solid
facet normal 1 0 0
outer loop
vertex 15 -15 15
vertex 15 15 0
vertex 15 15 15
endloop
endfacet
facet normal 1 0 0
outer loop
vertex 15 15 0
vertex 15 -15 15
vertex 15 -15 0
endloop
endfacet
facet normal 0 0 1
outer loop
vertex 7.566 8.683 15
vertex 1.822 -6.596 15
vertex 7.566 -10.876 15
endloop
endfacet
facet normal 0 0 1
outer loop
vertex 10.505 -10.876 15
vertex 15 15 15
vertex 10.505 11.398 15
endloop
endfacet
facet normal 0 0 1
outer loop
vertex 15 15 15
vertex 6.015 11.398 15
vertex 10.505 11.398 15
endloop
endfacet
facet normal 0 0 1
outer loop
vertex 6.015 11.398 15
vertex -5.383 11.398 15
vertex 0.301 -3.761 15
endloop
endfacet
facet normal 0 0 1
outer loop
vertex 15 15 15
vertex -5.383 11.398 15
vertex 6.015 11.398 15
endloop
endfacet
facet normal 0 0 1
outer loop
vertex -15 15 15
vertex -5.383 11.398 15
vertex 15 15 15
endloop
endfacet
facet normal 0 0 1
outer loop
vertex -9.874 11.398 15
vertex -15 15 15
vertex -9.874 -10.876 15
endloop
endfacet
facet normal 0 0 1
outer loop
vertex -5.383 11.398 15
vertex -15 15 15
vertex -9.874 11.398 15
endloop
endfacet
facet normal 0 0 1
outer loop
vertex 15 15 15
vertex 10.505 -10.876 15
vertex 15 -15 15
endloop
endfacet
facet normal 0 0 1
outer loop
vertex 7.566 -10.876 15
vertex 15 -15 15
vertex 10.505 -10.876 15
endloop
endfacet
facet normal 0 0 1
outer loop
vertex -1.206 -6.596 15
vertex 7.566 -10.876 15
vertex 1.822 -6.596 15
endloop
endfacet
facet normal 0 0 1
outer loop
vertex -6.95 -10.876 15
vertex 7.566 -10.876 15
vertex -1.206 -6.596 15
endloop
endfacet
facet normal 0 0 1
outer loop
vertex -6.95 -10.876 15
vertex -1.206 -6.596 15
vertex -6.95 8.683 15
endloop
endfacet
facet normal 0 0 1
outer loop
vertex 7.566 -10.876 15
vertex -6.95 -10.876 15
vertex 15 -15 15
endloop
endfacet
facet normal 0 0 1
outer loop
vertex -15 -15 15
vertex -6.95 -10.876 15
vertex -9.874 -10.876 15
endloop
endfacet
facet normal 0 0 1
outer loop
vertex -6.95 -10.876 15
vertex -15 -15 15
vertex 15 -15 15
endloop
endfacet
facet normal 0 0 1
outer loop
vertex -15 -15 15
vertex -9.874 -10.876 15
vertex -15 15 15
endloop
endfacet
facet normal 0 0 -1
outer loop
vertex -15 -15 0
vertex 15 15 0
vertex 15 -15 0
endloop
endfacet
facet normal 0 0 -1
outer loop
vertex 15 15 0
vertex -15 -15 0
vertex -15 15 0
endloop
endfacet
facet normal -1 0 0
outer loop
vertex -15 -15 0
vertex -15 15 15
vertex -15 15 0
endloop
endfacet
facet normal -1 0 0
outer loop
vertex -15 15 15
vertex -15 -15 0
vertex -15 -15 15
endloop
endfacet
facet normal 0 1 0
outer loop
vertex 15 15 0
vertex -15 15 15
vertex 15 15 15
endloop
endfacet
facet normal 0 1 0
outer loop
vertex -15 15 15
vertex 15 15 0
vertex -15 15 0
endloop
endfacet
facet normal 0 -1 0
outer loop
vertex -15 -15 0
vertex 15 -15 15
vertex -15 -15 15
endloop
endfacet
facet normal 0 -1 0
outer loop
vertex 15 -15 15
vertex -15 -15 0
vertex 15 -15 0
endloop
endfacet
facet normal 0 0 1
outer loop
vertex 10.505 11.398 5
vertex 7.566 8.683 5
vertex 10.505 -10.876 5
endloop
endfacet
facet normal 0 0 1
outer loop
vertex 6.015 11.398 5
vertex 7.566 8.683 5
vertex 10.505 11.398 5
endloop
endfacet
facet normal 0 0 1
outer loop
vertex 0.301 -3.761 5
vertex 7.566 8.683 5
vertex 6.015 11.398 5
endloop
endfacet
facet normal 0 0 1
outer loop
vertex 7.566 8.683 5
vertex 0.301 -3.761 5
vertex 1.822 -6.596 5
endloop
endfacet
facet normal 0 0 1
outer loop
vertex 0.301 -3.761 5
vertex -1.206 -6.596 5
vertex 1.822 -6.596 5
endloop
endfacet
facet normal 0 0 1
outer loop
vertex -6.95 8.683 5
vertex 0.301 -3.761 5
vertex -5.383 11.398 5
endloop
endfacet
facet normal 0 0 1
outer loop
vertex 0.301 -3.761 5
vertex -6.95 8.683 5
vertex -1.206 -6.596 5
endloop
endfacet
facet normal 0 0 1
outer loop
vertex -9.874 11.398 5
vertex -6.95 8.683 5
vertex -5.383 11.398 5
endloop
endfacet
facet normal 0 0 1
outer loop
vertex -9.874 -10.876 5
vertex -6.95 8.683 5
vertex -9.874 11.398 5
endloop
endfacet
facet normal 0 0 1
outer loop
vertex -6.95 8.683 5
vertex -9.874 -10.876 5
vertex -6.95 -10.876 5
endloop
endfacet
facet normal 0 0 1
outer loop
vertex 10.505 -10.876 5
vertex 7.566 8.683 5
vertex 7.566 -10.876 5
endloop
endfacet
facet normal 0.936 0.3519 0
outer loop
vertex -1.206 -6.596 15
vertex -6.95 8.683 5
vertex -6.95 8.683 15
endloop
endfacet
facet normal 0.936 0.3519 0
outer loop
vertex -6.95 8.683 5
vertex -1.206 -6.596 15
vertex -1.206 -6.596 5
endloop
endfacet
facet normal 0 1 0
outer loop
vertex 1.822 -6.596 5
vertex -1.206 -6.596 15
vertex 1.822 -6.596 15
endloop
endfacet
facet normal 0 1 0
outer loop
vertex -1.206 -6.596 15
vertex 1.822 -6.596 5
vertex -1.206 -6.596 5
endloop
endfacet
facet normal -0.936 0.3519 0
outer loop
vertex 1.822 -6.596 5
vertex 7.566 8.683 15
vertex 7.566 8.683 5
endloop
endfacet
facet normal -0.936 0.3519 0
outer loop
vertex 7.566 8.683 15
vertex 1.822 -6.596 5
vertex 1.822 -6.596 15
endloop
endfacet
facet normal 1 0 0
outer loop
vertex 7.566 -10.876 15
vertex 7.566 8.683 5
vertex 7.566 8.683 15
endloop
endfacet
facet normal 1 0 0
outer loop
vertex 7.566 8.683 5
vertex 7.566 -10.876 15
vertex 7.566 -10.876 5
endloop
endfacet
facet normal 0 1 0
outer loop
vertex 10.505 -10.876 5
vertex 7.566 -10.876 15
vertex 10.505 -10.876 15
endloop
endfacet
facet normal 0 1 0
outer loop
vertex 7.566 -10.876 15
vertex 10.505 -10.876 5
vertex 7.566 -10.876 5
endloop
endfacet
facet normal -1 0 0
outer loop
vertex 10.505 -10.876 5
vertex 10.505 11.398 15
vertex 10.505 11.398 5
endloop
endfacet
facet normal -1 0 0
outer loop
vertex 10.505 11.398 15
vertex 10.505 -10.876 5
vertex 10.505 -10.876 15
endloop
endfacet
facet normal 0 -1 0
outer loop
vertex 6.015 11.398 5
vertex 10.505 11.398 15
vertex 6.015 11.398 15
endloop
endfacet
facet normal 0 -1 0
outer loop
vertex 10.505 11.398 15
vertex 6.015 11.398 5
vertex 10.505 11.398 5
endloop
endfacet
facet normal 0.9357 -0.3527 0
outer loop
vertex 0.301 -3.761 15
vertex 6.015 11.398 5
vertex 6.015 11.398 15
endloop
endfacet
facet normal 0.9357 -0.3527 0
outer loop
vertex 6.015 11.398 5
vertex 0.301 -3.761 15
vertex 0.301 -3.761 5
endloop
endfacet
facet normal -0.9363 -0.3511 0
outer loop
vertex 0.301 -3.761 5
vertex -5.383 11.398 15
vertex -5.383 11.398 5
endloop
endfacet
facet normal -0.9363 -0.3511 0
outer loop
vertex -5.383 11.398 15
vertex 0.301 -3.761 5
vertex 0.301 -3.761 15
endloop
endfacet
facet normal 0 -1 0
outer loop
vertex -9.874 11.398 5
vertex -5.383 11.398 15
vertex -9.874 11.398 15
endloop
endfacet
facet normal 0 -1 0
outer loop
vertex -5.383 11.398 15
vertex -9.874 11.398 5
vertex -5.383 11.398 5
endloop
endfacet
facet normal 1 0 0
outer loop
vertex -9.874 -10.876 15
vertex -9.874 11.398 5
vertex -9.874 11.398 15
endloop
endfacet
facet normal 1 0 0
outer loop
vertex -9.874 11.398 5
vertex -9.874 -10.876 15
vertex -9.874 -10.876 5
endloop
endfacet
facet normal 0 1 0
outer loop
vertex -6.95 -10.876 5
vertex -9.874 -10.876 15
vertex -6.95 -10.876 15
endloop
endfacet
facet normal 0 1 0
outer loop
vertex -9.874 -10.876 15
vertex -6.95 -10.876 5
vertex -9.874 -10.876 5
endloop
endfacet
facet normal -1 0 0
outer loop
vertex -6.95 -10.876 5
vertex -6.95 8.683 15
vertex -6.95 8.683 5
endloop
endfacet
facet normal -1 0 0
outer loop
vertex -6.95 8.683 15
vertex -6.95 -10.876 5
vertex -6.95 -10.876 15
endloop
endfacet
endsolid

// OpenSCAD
// LetterBlock.scad - Basic usage of text() and linear_extrude()

// Module instantiation
LetterBlock("M");

// Module definition.
// size=30 defines an optional parameter with a default value.
module LetterBlock(letter, size = 30) {
    difference() {
        translate([0, 0, size / 4]) cube([size, size, size / 2], center = true);
        translate([0, 0, size / 6]) {
            // convexity is needed for correct preview
            // since characters can be highly concave
            linear_extrude(height = size, convexity = 4)
                text(
                    letter,
                    size = size * 22 / 30,
                    font = "Bitstream Vera Sans",
                    halign = "center",
                    valign = "center"
                );
        }
    }
}

echo(version = version());
// Written by Marius Kintel <marius@kintel.net>
//
// To the extent possible under law, the author(s) have dedicated all
// copyright and related and neighboring rights to this software to the
// public domain worldwide. This software is distributed without any
// warranty.
//
// You should have received a copy of the CC0 Public Domain
// Dedication along with this software.
// If not, see <http://creativecommons.org/publicdomain/zero/1.0/>.
